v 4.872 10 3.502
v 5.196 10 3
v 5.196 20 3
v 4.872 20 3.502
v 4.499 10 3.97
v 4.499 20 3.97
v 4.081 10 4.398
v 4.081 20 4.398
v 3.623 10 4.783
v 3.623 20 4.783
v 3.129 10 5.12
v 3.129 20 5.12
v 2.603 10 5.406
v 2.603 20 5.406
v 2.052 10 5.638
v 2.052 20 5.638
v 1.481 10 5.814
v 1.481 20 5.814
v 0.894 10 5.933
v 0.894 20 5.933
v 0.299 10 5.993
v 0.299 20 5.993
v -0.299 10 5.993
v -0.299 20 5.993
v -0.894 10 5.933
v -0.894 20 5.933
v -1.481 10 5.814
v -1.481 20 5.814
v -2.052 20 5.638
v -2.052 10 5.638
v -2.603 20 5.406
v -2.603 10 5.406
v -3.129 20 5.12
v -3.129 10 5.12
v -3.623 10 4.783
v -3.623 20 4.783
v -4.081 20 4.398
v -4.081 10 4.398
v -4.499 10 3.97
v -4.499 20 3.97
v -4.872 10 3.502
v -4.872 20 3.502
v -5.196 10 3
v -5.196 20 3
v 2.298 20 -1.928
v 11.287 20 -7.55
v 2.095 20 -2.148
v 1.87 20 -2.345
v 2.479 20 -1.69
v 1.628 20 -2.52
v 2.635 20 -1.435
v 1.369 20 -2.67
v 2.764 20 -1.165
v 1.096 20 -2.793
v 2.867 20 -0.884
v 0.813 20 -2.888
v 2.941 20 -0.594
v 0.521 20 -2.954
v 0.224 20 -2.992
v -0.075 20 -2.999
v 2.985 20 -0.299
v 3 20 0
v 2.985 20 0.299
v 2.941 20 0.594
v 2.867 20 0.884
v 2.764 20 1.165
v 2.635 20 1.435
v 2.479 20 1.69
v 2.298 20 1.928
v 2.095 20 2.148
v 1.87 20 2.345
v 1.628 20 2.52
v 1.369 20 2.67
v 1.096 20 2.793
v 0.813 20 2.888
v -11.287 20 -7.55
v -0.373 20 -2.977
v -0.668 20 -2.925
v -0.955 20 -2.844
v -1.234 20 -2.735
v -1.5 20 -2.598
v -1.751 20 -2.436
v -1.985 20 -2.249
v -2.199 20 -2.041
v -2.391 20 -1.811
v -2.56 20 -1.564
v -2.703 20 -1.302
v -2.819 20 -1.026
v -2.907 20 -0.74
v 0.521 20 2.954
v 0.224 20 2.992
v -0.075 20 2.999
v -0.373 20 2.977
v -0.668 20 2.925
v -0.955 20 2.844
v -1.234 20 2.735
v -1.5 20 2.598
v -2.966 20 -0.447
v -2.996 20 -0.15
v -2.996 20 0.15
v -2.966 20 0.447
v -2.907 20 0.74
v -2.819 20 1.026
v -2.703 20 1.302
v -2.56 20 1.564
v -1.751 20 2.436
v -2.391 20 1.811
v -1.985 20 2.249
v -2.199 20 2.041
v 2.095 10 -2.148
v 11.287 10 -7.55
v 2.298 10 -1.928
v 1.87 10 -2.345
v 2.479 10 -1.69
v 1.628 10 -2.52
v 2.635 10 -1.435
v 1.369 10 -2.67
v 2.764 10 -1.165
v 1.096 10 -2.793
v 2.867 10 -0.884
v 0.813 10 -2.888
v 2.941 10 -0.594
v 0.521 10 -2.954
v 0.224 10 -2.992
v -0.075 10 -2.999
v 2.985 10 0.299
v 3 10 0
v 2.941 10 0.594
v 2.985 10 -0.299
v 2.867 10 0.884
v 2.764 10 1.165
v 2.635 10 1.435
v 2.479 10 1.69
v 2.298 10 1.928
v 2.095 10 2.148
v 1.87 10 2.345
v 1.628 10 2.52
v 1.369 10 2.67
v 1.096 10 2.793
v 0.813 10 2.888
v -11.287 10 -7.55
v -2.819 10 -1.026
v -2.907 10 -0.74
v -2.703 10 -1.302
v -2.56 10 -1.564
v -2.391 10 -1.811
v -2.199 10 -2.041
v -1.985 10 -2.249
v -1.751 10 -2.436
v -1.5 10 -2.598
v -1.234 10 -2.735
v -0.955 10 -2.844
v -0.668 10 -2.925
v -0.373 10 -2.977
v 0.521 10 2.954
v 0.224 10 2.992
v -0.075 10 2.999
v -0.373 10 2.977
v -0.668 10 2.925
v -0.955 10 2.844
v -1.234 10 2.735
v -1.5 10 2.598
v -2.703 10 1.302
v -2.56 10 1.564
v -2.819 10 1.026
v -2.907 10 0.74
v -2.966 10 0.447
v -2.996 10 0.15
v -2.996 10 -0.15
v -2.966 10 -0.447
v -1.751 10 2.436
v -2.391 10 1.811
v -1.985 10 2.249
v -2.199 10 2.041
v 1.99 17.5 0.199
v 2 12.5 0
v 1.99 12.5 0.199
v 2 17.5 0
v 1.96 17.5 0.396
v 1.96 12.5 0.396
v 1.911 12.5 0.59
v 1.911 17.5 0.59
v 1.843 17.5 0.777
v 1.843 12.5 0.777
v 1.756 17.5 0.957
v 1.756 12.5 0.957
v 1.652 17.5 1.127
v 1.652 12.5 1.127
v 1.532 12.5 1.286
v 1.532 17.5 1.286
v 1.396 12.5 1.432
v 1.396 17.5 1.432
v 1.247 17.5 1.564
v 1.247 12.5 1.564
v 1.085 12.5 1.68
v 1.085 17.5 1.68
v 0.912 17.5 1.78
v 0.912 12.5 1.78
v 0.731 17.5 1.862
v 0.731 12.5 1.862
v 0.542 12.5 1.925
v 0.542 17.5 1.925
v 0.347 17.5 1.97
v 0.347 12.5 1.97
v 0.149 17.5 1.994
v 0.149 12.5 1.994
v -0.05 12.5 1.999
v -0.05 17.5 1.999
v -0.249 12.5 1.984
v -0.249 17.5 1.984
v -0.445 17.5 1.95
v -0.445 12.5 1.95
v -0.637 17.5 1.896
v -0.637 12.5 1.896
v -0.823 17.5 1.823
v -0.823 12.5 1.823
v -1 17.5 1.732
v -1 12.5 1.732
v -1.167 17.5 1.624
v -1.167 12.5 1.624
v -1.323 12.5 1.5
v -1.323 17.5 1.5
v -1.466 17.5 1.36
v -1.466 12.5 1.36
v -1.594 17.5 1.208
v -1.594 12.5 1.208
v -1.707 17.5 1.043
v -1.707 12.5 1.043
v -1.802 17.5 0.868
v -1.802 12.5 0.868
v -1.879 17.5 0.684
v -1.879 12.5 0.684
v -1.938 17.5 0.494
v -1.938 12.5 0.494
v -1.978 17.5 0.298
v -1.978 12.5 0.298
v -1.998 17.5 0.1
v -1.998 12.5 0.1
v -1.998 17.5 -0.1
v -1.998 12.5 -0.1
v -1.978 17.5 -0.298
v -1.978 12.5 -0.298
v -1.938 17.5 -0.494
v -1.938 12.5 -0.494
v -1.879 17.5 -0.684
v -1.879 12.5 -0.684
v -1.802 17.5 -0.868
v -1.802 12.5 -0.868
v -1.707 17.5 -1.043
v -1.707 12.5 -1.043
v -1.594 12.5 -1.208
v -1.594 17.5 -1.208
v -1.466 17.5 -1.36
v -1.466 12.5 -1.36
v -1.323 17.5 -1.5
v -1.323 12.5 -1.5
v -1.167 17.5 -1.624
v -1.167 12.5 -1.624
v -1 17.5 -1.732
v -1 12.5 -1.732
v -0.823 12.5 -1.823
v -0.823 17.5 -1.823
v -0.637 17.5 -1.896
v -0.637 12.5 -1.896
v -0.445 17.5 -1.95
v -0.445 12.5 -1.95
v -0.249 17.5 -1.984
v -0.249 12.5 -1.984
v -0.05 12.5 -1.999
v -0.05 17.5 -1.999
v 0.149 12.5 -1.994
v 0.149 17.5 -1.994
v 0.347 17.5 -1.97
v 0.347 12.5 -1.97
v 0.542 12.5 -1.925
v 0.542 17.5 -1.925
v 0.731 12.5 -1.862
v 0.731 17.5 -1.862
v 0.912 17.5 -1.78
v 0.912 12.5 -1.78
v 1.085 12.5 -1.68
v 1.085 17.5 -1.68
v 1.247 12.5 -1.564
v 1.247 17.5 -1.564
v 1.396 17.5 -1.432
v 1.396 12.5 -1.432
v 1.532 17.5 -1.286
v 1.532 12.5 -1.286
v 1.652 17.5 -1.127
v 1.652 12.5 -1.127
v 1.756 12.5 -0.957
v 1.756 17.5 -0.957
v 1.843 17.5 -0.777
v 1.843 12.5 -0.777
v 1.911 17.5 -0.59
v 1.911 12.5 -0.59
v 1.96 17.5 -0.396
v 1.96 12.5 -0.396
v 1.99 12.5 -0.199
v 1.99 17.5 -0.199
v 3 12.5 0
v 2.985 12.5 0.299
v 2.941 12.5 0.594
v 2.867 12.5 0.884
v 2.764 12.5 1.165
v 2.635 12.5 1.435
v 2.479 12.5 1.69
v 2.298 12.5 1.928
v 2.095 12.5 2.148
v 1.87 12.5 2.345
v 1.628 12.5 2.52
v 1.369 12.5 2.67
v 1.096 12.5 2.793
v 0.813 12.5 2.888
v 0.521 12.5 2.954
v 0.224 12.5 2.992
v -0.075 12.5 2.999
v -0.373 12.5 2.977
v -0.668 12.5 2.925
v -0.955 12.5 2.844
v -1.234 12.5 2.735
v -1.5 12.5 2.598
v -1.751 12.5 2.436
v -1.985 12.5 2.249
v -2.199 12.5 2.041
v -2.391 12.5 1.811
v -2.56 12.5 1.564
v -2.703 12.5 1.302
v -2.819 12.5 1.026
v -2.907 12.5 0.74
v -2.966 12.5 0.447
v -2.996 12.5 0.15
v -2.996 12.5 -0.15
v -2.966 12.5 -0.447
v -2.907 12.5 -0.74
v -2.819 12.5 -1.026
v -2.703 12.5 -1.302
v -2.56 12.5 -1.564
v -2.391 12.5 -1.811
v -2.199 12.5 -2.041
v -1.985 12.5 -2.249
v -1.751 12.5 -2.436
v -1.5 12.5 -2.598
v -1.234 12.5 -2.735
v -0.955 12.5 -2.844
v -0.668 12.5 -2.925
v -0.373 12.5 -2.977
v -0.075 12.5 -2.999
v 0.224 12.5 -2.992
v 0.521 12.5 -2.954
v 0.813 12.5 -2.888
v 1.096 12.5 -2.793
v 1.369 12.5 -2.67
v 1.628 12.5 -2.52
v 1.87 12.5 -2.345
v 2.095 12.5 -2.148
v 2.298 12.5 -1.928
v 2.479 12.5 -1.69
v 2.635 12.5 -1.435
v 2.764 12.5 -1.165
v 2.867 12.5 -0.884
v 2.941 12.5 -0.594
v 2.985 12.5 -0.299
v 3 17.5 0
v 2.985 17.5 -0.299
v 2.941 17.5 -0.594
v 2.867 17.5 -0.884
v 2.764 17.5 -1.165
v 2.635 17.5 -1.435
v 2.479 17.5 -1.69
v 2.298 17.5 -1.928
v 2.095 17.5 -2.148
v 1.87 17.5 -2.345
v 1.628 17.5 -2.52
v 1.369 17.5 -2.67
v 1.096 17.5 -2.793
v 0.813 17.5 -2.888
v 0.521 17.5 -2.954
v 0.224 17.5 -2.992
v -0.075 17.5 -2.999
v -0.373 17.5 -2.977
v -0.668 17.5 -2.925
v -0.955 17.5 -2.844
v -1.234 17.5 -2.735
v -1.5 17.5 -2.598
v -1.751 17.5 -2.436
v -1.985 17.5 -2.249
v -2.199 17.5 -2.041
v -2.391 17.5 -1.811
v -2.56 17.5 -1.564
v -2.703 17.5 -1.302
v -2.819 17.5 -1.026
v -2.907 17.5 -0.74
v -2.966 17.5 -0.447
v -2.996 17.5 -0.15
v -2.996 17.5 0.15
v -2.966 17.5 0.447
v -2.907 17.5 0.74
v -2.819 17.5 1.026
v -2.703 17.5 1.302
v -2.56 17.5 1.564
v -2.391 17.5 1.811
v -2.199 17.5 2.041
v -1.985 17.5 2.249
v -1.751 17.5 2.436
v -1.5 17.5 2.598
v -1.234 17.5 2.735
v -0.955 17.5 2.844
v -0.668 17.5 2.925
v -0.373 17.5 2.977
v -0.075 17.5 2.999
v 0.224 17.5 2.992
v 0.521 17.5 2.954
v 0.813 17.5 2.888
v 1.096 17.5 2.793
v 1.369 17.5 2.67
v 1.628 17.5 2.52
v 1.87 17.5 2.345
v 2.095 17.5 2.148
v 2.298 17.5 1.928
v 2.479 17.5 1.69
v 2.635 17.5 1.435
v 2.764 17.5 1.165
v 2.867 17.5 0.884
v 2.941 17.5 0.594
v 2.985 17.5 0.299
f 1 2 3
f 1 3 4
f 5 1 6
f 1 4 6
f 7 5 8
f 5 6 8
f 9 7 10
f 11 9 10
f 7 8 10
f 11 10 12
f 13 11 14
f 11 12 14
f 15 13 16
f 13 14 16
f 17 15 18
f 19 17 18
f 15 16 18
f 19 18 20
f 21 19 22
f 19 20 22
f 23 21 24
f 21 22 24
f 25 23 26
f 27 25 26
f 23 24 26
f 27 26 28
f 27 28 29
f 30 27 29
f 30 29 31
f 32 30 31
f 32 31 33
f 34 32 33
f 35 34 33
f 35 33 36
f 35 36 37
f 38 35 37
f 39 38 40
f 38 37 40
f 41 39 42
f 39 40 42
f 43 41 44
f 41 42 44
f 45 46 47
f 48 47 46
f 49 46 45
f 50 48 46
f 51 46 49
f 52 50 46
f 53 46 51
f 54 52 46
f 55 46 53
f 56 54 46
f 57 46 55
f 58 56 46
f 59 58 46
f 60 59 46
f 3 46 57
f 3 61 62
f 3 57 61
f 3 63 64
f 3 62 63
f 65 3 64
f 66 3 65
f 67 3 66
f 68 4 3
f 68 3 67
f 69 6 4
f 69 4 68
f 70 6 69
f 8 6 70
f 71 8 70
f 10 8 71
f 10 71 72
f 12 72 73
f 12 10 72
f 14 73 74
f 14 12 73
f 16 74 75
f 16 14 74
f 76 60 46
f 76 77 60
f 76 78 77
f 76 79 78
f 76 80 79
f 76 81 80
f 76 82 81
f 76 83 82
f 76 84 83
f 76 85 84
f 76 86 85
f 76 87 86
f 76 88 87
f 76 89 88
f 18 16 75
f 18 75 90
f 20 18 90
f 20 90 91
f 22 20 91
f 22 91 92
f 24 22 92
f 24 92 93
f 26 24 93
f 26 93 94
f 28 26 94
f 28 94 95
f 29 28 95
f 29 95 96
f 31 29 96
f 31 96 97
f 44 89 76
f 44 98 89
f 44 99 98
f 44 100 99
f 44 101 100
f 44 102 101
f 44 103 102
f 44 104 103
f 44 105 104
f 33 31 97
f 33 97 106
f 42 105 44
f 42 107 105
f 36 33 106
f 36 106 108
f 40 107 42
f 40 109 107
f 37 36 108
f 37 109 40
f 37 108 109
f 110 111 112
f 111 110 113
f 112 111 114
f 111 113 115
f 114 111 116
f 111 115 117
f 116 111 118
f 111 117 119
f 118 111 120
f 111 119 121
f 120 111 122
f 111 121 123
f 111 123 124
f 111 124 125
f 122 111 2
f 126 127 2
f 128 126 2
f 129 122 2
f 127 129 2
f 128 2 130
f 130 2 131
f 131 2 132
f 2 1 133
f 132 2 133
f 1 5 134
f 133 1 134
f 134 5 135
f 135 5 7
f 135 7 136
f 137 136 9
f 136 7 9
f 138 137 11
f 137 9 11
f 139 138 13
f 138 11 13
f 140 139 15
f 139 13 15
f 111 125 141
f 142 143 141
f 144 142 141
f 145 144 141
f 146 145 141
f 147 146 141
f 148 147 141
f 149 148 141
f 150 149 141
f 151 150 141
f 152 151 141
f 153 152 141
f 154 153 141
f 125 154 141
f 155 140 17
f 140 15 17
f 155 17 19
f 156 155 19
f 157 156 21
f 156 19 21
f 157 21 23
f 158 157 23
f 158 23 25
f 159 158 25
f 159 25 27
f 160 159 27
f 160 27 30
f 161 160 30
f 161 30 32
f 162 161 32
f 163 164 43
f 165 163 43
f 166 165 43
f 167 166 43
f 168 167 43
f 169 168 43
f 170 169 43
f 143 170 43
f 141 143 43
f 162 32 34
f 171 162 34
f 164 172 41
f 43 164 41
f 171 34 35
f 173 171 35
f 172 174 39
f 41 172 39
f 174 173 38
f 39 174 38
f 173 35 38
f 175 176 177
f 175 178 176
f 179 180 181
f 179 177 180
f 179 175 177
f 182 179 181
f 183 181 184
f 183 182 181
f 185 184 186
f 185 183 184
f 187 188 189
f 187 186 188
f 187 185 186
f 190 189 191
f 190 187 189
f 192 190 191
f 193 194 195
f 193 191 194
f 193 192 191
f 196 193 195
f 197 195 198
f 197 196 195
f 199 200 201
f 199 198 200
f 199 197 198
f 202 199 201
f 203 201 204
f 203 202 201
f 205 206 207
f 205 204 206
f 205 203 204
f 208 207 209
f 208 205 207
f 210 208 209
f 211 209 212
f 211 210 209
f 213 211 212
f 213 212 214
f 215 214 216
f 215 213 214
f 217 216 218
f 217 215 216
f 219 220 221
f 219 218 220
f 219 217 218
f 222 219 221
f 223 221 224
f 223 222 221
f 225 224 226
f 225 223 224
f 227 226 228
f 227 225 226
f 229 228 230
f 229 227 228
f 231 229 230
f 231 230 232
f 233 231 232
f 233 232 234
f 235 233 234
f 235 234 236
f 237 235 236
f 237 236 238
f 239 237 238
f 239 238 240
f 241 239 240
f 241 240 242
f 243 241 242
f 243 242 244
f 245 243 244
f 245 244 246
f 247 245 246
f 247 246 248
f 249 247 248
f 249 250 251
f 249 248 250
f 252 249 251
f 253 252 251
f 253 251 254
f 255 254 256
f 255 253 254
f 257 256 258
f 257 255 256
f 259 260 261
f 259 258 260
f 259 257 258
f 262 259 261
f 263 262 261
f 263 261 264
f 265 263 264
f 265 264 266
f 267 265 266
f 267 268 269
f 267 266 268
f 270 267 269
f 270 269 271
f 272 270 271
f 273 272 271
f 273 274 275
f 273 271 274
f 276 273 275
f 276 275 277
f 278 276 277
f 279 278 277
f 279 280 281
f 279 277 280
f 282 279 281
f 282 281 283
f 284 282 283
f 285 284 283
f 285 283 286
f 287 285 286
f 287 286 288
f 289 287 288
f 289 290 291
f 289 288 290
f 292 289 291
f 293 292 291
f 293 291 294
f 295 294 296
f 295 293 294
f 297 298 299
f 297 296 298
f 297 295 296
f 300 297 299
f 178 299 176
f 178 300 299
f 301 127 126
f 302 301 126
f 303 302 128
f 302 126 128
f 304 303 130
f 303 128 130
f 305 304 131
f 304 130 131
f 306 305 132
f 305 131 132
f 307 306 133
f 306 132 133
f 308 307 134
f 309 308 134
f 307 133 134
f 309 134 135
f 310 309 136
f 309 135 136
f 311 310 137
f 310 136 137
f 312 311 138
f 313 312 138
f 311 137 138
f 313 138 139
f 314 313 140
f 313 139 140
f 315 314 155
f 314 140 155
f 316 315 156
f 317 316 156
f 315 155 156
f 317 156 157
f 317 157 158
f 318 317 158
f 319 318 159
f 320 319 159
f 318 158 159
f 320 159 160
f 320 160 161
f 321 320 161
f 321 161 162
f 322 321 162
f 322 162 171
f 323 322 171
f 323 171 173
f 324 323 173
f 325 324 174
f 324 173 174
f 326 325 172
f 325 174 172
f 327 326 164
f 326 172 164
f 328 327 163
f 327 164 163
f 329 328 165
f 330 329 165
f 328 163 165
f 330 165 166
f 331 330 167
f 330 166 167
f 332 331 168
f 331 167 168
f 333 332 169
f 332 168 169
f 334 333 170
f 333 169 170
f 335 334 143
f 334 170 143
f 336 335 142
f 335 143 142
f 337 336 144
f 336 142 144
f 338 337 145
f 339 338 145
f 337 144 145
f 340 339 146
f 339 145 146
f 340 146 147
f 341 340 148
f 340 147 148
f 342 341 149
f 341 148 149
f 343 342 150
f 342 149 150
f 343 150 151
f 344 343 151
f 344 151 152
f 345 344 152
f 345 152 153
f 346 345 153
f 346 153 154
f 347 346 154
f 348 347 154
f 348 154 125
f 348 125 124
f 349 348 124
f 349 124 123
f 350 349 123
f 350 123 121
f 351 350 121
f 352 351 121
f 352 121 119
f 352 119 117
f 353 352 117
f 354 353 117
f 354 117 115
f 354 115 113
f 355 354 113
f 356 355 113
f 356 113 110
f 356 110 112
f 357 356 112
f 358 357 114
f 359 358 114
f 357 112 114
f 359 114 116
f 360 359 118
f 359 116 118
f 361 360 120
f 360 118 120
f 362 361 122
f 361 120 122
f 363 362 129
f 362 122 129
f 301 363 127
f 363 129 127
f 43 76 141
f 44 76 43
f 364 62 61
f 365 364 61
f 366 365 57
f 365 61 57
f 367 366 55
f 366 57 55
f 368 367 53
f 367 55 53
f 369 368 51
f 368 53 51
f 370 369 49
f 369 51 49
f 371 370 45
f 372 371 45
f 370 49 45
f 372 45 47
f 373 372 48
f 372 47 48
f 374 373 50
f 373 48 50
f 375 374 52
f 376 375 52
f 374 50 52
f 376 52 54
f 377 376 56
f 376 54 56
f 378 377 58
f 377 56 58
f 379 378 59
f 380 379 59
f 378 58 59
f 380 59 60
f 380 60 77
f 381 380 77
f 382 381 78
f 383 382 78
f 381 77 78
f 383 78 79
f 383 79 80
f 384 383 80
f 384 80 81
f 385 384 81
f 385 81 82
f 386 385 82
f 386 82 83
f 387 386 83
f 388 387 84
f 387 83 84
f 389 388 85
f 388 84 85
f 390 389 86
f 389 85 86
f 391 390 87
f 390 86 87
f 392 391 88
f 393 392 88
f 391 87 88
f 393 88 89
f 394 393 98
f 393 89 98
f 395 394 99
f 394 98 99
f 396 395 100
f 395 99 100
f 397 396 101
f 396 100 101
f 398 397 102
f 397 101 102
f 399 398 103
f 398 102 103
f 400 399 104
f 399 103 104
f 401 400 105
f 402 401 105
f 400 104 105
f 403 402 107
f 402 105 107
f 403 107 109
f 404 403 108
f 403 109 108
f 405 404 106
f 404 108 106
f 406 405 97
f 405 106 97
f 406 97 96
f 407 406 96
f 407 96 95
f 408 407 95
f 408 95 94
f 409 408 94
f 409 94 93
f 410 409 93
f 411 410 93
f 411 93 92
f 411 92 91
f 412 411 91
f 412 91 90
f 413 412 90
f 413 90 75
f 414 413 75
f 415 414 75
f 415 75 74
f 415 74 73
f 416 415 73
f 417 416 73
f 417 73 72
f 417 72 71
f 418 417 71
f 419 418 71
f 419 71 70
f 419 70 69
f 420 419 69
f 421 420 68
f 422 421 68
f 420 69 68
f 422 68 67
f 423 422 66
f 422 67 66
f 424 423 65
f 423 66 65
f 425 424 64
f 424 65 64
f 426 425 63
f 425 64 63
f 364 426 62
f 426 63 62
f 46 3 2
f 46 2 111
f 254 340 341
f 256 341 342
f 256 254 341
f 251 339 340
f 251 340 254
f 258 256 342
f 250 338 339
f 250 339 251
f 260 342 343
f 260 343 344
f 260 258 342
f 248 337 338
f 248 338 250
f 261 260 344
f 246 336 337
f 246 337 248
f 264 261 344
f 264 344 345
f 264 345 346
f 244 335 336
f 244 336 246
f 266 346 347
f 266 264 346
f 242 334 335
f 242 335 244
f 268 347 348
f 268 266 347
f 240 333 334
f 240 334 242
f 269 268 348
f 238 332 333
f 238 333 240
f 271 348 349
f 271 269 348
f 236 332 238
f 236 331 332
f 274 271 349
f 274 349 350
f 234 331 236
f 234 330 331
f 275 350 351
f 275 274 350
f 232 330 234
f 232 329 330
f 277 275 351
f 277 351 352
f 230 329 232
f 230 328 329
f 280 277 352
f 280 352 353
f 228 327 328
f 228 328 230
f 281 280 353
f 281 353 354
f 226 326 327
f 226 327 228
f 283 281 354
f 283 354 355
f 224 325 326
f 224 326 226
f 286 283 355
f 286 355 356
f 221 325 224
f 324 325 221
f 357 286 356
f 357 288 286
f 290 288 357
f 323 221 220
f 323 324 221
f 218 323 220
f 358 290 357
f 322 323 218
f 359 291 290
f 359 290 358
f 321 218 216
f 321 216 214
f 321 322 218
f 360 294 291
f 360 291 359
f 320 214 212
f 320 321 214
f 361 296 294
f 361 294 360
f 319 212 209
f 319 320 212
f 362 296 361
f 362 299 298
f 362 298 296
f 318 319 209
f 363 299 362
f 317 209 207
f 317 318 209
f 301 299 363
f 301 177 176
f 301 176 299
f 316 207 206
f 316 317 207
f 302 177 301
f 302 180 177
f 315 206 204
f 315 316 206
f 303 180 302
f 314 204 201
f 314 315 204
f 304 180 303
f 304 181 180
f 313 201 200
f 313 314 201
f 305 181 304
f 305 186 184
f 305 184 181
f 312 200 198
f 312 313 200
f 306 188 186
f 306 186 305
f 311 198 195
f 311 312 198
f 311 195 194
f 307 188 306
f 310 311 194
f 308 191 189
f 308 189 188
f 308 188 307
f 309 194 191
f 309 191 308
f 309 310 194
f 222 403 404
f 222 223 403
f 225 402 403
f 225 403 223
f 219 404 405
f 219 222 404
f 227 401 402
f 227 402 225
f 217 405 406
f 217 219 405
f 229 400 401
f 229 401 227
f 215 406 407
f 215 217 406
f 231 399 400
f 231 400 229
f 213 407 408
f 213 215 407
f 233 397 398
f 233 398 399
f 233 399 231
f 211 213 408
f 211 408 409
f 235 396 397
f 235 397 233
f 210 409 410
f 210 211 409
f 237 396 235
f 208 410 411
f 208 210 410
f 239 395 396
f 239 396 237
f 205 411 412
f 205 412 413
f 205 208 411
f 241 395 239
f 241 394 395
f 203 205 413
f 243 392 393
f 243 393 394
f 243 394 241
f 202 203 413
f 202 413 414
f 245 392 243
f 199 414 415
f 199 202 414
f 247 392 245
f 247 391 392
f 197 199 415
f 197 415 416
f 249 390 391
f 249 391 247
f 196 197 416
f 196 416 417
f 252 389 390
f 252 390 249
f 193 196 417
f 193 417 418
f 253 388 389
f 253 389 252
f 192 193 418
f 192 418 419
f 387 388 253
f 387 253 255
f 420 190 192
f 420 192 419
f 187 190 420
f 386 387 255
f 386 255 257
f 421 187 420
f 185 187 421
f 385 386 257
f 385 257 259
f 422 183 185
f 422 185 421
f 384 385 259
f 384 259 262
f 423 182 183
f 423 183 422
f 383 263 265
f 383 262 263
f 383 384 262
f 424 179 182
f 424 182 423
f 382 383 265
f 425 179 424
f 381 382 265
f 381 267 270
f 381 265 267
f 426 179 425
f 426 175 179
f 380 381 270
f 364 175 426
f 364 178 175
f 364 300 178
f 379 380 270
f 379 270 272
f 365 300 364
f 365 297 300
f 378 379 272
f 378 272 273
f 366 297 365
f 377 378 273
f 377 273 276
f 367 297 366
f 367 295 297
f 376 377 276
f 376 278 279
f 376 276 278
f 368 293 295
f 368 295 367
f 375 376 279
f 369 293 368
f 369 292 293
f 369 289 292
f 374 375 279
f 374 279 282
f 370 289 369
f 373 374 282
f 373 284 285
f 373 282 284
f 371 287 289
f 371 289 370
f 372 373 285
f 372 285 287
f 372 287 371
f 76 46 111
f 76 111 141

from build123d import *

# Parameters (mm, degrees)
SKETCH012_R     = 2
PAD010_DEPTH    = 10
SKETCH013_R     = 3
POCKET_DEPTH    = 2.5
SKETCH014_R     = 3
POCKET001_DEPTH = 2.5


with BuildPart() as part:
    # Sketch012 → Pad010 (new body)
    with BuildSketch(Plane.XZ.offset(-20)):
        with BuildLine():
            Line((-11.287198, -7.55), (-5.196164, 2.99998))
            ThreePointArc((5.196164, 2.99998), (0, 6), (-5.196164, 2.99998))
            Line((5.196164, 2.99998), (11.287198, -7.55))
            Line((11.287198, -7.55), (-11.287198, -7.55))
        make_face()
        Circle(SKETCH012_R, mode=Mode.SUBTRACT)
    extrude(amount=PAD010_DEPTH)

    # Sketch013 → Pocket (cut)
    with BuildSketch(Plane.XZ.offset(-10)):
        Circle(SKETCH013_R)
    extrude(amount=-POCKET_DEPTH, mode=Mode.SUBTRACT)

    # Sketch014 → Pocket001 (cut)
    with BuildSketch(Plane(origin=(0, 20, 0), x_dir=(1, 0, 0), z_dir=(0, 1, 0))):
        Circle(SKETCH014_R)
    extrude(amount=-POCKET001_DEPTH, mode=Mode.SUBTRACT)


solid = part.part
